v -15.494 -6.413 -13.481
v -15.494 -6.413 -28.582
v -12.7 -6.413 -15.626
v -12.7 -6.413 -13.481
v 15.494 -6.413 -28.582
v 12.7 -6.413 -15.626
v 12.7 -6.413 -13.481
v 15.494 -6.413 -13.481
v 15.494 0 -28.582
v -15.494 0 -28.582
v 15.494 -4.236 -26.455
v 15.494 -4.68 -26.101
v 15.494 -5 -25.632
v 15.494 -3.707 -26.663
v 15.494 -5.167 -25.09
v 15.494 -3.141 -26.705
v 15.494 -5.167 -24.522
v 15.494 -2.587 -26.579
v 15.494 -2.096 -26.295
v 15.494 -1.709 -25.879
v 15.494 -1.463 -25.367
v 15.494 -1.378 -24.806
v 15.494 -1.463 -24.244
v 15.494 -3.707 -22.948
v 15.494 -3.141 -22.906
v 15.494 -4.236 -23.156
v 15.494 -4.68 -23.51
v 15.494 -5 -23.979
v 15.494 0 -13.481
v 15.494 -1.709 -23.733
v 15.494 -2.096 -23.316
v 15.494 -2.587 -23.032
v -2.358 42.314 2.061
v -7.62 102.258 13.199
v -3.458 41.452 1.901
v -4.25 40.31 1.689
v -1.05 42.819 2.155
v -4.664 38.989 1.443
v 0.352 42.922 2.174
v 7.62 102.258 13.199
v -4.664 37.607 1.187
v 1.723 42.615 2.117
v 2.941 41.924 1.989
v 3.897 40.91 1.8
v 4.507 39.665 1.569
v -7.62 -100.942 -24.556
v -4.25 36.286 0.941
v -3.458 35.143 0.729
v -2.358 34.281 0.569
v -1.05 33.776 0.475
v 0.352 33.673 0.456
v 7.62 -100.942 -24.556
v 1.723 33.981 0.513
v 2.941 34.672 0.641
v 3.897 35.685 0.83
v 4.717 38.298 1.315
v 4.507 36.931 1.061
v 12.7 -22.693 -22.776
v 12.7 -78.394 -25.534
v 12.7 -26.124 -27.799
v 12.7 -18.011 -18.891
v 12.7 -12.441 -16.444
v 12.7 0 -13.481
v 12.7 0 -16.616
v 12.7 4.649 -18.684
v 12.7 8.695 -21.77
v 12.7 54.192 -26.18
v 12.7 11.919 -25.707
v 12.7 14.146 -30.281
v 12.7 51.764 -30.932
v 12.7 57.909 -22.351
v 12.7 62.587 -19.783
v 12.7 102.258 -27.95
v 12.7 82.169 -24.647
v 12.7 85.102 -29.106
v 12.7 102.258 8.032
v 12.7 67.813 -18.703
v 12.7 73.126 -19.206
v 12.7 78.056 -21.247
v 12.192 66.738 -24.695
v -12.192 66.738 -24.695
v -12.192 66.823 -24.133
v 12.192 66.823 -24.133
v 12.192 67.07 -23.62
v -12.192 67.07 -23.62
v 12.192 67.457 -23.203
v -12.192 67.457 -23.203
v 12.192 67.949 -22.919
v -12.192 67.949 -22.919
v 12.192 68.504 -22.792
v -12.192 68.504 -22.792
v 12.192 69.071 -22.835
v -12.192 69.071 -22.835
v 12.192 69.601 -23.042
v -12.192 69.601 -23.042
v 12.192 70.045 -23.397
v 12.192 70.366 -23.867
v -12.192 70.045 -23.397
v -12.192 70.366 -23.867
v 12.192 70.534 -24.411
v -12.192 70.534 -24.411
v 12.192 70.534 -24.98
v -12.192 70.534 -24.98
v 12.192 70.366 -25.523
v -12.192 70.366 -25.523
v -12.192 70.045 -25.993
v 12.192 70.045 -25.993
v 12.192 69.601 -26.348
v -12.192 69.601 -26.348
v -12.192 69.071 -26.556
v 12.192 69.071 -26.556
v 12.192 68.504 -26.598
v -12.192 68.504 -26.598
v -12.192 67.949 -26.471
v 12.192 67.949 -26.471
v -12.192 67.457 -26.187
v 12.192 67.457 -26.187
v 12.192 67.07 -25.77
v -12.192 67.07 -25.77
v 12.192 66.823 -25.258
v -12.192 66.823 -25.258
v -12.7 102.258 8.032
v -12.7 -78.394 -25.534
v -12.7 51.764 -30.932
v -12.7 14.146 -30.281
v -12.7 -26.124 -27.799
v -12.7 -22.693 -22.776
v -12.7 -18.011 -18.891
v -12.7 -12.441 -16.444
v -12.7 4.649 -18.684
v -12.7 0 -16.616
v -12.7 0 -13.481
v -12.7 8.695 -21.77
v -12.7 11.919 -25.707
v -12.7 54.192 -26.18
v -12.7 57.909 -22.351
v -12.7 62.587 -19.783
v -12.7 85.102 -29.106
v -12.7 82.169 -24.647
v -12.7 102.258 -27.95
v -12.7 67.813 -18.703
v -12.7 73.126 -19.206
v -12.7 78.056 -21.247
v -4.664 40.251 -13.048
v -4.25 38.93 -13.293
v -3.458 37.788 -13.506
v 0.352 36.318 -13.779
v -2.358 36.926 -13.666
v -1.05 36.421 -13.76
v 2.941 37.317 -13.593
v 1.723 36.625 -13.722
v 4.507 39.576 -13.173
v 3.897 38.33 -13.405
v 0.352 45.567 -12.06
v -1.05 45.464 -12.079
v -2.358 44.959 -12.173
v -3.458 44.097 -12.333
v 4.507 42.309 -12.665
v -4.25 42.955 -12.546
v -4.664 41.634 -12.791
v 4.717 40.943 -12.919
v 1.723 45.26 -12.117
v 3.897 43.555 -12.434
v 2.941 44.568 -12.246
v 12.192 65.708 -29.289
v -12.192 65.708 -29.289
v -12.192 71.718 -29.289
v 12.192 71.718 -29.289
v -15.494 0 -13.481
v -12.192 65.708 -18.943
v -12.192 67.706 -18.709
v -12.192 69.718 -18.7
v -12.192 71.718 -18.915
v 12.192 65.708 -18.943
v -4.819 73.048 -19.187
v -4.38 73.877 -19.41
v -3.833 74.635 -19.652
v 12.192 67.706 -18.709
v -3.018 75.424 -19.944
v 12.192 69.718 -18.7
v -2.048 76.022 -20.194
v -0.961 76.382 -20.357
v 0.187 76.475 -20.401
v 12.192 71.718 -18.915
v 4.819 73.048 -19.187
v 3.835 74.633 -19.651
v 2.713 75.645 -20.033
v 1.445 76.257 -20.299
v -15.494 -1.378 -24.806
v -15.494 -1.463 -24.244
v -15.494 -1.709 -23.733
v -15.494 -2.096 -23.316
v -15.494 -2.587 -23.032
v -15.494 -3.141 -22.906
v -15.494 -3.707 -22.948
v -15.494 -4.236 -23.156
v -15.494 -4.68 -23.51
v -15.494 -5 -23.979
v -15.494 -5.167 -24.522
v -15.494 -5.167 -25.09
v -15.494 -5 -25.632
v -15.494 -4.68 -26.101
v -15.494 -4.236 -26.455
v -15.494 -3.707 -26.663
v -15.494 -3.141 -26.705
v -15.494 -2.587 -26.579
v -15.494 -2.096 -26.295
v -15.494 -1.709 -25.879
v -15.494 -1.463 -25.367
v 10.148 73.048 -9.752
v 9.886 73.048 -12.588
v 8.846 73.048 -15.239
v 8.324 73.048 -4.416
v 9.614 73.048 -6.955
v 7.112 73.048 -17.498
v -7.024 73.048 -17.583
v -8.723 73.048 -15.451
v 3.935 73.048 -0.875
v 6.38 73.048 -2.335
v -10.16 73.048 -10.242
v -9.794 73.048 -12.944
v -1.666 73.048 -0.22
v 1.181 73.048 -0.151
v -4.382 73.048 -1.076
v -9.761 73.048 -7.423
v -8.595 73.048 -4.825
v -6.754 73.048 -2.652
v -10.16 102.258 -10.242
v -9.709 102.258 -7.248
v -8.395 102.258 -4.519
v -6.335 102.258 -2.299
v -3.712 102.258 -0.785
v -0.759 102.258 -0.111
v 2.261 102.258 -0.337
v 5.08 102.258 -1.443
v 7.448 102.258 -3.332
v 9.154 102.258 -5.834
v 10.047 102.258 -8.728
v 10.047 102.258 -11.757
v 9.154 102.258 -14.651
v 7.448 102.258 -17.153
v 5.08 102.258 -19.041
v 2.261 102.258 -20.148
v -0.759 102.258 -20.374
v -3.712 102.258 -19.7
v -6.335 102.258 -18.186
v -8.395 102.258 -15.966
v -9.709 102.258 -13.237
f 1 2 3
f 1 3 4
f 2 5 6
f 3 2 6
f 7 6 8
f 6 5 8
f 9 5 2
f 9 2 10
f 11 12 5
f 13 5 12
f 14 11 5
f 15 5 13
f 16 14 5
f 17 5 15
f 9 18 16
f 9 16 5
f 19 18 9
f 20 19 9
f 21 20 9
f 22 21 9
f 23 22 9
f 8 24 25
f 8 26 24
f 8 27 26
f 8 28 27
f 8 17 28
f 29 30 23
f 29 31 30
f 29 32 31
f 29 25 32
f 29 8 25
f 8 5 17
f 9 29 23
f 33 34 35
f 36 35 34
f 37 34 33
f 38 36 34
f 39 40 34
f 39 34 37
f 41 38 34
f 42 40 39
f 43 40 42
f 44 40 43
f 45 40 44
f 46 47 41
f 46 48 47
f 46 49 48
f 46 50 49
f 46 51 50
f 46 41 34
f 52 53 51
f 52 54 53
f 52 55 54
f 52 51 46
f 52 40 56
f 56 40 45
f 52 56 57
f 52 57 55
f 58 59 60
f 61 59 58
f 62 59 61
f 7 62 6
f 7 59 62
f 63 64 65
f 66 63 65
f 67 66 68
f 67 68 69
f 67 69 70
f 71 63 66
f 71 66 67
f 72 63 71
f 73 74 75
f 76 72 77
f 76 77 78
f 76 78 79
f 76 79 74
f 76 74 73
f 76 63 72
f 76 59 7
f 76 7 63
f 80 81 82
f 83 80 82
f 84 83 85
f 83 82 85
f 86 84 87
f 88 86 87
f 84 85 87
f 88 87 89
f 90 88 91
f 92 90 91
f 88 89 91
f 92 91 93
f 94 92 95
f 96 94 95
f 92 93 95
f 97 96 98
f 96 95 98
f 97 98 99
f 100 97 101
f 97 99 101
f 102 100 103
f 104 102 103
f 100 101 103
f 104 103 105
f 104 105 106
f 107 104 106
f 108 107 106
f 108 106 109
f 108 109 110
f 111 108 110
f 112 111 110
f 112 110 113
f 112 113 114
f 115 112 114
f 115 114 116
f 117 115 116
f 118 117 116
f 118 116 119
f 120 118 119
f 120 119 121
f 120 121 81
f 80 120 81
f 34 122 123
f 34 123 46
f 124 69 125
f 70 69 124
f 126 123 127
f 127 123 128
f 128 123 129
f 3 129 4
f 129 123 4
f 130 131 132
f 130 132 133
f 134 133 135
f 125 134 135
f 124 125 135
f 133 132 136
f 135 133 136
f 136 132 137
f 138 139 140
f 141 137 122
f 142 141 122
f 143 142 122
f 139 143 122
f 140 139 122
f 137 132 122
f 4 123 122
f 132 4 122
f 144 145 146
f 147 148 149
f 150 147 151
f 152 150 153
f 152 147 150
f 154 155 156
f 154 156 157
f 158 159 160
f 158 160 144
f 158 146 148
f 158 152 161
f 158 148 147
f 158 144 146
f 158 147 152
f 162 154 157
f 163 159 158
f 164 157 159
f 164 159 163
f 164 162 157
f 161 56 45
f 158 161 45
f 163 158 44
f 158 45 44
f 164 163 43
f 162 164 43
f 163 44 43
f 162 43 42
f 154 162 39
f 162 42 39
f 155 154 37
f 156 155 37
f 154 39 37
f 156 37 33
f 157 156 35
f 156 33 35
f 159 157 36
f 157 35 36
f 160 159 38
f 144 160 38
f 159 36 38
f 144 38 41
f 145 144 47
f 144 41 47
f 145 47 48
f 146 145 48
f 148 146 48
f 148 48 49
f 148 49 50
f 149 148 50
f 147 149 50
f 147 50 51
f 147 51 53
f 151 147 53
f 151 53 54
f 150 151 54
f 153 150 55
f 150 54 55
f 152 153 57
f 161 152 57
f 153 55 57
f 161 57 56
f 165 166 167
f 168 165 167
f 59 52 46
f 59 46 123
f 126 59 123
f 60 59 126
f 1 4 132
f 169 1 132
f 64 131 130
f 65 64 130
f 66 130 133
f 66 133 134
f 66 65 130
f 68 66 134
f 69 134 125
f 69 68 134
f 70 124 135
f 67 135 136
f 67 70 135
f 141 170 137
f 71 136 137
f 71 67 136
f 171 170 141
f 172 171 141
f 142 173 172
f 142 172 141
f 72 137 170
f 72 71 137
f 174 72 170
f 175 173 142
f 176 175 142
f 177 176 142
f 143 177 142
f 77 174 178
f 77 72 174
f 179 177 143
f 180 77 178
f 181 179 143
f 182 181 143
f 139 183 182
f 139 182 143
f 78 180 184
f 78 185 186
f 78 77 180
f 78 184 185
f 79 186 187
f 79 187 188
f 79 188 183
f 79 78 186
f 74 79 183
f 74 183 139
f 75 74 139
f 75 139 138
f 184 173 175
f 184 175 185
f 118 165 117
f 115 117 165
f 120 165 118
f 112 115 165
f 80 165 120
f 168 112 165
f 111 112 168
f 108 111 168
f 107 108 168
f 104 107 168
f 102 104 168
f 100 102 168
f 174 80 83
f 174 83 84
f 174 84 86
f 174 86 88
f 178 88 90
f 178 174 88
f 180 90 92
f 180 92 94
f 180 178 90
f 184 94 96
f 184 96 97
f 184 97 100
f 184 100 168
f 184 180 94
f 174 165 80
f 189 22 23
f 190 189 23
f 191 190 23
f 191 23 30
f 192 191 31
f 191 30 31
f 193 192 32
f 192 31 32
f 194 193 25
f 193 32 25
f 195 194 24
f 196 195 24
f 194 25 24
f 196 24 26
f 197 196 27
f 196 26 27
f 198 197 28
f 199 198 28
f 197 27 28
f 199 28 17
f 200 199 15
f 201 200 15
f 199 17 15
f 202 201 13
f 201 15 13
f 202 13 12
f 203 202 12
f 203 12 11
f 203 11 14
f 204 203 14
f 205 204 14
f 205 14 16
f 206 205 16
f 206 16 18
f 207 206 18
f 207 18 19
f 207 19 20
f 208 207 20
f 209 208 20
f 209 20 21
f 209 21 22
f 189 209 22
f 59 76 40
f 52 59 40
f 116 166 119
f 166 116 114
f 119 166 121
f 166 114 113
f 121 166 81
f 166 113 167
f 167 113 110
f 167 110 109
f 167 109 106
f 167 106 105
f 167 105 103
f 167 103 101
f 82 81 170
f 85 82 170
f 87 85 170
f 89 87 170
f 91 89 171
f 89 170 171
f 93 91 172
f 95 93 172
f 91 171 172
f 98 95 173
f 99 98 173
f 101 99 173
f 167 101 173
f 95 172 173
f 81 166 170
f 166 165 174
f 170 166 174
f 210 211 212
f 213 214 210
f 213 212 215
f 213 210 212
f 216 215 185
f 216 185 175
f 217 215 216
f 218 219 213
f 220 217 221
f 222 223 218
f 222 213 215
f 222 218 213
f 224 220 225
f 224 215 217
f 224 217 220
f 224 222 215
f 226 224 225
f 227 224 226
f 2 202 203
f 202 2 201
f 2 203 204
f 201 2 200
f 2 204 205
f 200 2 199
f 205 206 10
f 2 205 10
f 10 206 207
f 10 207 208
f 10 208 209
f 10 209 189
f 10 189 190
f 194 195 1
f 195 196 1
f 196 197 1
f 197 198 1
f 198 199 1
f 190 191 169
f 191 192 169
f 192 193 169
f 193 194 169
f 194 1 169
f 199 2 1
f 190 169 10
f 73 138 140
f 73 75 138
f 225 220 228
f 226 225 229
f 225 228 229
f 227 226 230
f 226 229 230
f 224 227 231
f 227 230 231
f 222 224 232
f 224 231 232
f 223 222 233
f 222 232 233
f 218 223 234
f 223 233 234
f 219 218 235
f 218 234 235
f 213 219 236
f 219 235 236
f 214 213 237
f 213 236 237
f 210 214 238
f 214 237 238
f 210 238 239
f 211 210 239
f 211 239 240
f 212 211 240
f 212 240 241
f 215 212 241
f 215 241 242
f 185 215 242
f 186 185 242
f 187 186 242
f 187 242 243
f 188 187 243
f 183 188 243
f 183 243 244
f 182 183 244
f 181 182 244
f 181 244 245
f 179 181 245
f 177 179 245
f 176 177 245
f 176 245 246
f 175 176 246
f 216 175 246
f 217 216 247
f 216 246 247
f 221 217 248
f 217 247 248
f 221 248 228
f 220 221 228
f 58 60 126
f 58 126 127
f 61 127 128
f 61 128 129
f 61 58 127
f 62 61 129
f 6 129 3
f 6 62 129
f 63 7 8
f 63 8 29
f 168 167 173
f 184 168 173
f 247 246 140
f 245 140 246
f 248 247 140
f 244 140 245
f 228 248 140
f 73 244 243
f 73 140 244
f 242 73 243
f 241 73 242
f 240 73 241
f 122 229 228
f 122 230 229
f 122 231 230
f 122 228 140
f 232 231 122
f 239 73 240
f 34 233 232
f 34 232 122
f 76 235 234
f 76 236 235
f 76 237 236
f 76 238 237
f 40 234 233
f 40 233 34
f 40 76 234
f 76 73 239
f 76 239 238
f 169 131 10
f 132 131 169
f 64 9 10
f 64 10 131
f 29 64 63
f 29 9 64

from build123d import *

# Parameters (mm, degrees)
F1_DEPTH       = 12.7
F1_DEPTH_BACK  = 12.7
F2_SIZE        = 5.08
F3_R           = 10.16
F4_DEPTH       = 29.21
F5_R           = 4.7169653767
F6_DEPTH       = 14.478
F7_W           = 6.4129335806
F7_H           = 15.100935474
F8_DEPTH       = 15.494
F8_DEPTH_BACK  = 15.494
F9_R           = 1.905
F10_DEPTH      = 39.878
F11_W          = 6.0101076961
F11_H          = 16.6161805391
F12_DEPTH      = 12.192
F12_DEPTH_BACK = 12.192
F13_R          = 1.9082928371
F14_DEPTH      = 25.4


with BuildPart() as f1:
    # F0 (on Right) → F1 (new body, two sides)
    with BuildSketch(Plane.YZ) as f1_sk:
        with BuildLine():
            Line((102.2577819586, 13.1989740504), (-100.9422180414, -24.5563495133))
            Line((-100.9422180414, -24.5563495133), (-26.1237075026, -27.7993018095))
            ThreePointArc((-26.1237075026, -27.7993018095), (-5.1643274907, -15.6669524817), (14.1464179811, -30.2814870284))
            Line((14.1464179811, -30.2814870284), (51.7638866865, -30.9321125706))
            ThreePointArc((51.7638866865, -30.9321125706), (67.8129634232, -18.702842322), (85.1018259738, -29.1058777742))
            Line((85.1018259738, -29.1058777742), (102.2577819586, -27.9500877853))
            Line((102.2577819586, -27.9500877853), (102.2577819586, 13.1989740504))
        make_face()
    extrude(amount=F1_DEPTH)
    extrude(f1_sk.sketch, amount=-F1_DEPTH_BACK)

    # F2
    f2_edges = [f1.edges().sort_by_distance(p)[0] for p in [
        (12.7, 0.657782, -5.678688),
        (-12.7, 0.657782, -5.678688),
    ]]
    chamfer(f2_edges, length=F2_SIZE)

    # F3 (on face) → F4 (cut)
    with BuildSketch(Plane(origin=(0, 102.2577819586, 0), x_dir=(-1, 0, 0), z_dir=(0, 1, 0))):
        with Locations((0, -10.2422883113)):
            Circle(F3_R)
    extrude(amount=-F4_DEPTH, mode=Mode.SUBTRACT)

    # F5 (on face) → F6 (cut)
    with BuildSketch(Plane(origin=(0, 1.041861913, -5.6073242327), x_dir=(1, 0, 0), z_dir=(0, -0.1826772268, 0.9831729404))):
        with Locations((0, 37.893474102)):
            Circle(F5_R)
    extrude(amount=-F6_DEPTH, mode=Mode.SUBTRACT)

    # F7 (on Right) → F8 (join, two sides)
    with BuildSketch(Plane.YZ) as f8_sk:
        with Locations((-3.2064667903, -21.0316376761)):
            Rectangle(F7_W, F7_H)
    extrude(amount=F8_DEPTH)
    extrude(f8_sk.sketch, amount=-F8_DEPTH_BACK)

    # F9 (on face) → F10 (cut)
    with BuildSketch(Plane.YZ.offset(15.494)):
        with Locations((-3.2832995057, -24.805707857)):
            Circle(F9_R)
    extrude(amount=-F10_DEPTH, mode=Mode.SUBTRACT)

    # F11 (on Right) → F12 (join, two sides)
    with BuildSketch(Plane.YZ) as f12_sk:
        with Locations((68.7134154141, -20.981086418)):
            Rectangle(F11_W, F11_H)
    extrude(amount=F12_DEPTH)
    extrude(f12_sk.sketch, amount=-F12_DEPTH_BACK)

    # F13 (on face) → F14 (cut)
    with BuildSketch(Plane(origin=(-12.192, 0, 0), x_dir=(0, -1, 0), z_dir=(-1, 0, 0))):
        with Locations((-68.646594882, -24.6950872242)):
            Circle(F13_R)
    extrude(amount=-F14_DEPTH, mode=Mode.SUBTRACT)


solid = f1.part
